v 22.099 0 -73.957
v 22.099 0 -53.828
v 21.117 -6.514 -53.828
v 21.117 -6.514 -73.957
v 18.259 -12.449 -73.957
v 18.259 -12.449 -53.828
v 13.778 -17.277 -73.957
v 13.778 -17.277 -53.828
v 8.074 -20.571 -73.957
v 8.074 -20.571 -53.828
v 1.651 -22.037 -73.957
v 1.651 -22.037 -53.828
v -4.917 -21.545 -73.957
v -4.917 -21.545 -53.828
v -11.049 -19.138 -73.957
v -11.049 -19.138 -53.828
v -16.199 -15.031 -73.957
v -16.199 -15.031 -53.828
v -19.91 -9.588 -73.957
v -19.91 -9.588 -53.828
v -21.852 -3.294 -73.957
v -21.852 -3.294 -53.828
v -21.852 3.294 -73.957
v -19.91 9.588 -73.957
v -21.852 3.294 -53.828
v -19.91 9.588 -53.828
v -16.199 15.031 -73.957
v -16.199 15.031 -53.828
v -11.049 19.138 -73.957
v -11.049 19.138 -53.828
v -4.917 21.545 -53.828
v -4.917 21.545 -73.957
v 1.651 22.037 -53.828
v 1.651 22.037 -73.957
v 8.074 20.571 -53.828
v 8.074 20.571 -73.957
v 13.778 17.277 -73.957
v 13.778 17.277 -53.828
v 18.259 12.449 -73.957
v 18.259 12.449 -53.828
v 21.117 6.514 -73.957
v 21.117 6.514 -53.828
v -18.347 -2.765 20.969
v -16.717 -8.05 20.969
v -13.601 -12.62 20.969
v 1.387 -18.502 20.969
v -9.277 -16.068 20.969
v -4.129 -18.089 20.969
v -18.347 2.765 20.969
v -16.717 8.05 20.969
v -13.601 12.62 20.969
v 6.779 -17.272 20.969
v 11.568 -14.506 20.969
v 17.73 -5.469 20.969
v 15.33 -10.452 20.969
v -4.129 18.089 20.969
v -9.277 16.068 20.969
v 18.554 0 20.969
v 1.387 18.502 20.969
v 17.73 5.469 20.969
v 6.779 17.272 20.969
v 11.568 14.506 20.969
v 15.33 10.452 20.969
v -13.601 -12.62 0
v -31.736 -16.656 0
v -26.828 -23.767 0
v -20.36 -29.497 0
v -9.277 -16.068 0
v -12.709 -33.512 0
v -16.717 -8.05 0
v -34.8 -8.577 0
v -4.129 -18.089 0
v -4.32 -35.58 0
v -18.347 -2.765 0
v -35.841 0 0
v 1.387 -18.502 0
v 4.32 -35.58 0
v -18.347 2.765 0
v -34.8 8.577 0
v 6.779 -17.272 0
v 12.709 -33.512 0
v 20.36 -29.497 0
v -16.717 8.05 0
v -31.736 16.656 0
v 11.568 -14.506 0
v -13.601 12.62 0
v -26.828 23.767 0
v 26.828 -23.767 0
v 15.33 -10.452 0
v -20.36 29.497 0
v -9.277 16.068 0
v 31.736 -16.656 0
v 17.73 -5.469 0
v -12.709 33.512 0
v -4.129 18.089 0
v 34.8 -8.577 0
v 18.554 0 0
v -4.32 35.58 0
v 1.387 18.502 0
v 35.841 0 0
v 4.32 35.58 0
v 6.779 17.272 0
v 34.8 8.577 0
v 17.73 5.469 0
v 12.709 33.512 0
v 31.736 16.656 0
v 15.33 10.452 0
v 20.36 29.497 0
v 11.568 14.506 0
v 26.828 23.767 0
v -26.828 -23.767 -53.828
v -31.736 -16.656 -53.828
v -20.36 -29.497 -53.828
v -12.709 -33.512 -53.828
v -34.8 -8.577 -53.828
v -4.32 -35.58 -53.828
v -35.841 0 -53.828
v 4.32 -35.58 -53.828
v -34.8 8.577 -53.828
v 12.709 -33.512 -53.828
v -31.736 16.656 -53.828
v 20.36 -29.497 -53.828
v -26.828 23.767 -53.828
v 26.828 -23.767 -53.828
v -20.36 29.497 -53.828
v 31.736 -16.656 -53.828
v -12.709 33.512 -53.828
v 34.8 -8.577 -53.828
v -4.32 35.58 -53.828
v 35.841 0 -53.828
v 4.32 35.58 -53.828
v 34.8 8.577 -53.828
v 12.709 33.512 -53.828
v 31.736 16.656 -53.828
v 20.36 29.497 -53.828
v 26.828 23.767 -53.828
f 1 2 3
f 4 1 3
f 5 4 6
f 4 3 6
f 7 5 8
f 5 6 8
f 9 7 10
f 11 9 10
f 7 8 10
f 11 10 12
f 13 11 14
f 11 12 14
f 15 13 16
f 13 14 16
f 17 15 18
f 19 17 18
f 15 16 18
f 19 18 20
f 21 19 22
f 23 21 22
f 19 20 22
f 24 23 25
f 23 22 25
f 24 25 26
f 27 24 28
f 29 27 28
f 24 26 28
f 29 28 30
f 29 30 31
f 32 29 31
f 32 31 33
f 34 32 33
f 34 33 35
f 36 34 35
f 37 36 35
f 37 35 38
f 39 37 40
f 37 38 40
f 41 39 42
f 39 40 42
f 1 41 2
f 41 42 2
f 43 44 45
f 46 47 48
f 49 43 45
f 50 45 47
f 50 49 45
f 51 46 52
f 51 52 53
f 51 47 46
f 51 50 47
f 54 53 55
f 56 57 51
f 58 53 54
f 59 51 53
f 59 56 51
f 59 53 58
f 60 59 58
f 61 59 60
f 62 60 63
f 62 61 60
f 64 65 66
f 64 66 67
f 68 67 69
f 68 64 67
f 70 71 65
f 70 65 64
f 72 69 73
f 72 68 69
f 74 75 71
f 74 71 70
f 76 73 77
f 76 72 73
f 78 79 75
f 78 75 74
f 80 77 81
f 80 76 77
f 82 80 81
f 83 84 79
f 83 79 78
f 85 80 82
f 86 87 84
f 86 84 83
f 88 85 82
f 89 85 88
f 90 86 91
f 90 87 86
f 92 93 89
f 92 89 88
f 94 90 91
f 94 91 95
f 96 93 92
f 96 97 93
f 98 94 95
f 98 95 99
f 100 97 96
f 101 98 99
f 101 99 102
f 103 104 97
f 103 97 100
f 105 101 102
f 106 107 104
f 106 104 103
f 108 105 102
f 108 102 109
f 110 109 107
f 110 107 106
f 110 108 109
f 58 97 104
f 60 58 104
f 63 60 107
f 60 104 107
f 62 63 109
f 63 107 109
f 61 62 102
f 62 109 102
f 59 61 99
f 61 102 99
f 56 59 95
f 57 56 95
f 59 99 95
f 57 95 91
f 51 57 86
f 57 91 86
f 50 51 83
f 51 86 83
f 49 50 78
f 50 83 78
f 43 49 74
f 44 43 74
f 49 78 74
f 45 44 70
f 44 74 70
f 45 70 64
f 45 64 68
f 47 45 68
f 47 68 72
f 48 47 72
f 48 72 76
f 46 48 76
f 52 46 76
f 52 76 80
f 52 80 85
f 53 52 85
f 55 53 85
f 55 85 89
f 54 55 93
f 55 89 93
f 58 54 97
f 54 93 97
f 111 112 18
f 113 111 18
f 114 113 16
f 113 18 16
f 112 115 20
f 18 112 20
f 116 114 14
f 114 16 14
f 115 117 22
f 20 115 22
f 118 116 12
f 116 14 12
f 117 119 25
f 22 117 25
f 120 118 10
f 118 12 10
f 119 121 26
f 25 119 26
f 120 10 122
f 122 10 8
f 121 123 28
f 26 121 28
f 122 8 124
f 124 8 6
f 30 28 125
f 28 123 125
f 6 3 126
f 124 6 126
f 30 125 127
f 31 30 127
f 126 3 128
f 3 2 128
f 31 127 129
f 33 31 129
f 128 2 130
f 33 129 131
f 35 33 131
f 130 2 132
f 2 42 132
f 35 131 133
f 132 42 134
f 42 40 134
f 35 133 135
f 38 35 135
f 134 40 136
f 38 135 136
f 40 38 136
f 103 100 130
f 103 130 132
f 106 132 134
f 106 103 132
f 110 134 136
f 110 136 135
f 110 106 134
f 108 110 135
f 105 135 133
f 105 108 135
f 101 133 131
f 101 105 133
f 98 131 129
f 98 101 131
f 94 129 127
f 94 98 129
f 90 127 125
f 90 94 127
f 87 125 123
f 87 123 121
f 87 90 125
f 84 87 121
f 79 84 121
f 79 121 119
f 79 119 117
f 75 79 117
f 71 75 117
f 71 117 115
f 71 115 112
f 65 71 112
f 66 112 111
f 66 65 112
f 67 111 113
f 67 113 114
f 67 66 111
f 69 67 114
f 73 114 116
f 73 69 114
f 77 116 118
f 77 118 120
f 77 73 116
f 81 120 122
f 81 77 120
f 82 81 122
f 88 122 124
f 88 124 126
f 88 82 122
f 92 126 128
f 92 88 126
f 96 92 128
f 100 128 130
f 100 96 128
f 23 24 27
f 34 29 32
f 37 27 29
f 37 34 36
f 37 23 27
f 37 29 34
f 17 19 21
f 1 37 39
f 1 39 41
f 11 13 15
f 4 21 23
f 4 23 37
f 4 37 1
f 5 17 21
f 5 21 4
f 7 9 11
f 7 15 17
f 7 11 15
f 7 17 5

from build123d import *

# Parameters (mm, degrees)
F0_R     = 18.554146
F1_DEPTH = 20.96888
F2_R     = 35.841286
F3_DEPTH = 53.82837
F5_R     = 22.098703
F6_DEPTH = 20.12846


with BuildPart() as f1:
    # F0 (on Top) → F1 (new body)
    with BuildSketch(Plane.XY):
        Circle(F0_R)
    extrude(amount=F1_DEPTH)

    # F2 (on Top) → F3 (join)
    with BuildSketch(Plane.XY):
        Circle(F2_R)
    extrude(amount=-F3_DEPTH)

    # F5 (on face) → F6 (join)
    with BuildSketch(Plane(origin=(0, 0, -53.82837), x_dir=(1, 0, 0), z_dir=(0, 0, -1))):
        Circle(F5_R)
    extrude(amount=F6_DEPTH)


solid = f1.part
